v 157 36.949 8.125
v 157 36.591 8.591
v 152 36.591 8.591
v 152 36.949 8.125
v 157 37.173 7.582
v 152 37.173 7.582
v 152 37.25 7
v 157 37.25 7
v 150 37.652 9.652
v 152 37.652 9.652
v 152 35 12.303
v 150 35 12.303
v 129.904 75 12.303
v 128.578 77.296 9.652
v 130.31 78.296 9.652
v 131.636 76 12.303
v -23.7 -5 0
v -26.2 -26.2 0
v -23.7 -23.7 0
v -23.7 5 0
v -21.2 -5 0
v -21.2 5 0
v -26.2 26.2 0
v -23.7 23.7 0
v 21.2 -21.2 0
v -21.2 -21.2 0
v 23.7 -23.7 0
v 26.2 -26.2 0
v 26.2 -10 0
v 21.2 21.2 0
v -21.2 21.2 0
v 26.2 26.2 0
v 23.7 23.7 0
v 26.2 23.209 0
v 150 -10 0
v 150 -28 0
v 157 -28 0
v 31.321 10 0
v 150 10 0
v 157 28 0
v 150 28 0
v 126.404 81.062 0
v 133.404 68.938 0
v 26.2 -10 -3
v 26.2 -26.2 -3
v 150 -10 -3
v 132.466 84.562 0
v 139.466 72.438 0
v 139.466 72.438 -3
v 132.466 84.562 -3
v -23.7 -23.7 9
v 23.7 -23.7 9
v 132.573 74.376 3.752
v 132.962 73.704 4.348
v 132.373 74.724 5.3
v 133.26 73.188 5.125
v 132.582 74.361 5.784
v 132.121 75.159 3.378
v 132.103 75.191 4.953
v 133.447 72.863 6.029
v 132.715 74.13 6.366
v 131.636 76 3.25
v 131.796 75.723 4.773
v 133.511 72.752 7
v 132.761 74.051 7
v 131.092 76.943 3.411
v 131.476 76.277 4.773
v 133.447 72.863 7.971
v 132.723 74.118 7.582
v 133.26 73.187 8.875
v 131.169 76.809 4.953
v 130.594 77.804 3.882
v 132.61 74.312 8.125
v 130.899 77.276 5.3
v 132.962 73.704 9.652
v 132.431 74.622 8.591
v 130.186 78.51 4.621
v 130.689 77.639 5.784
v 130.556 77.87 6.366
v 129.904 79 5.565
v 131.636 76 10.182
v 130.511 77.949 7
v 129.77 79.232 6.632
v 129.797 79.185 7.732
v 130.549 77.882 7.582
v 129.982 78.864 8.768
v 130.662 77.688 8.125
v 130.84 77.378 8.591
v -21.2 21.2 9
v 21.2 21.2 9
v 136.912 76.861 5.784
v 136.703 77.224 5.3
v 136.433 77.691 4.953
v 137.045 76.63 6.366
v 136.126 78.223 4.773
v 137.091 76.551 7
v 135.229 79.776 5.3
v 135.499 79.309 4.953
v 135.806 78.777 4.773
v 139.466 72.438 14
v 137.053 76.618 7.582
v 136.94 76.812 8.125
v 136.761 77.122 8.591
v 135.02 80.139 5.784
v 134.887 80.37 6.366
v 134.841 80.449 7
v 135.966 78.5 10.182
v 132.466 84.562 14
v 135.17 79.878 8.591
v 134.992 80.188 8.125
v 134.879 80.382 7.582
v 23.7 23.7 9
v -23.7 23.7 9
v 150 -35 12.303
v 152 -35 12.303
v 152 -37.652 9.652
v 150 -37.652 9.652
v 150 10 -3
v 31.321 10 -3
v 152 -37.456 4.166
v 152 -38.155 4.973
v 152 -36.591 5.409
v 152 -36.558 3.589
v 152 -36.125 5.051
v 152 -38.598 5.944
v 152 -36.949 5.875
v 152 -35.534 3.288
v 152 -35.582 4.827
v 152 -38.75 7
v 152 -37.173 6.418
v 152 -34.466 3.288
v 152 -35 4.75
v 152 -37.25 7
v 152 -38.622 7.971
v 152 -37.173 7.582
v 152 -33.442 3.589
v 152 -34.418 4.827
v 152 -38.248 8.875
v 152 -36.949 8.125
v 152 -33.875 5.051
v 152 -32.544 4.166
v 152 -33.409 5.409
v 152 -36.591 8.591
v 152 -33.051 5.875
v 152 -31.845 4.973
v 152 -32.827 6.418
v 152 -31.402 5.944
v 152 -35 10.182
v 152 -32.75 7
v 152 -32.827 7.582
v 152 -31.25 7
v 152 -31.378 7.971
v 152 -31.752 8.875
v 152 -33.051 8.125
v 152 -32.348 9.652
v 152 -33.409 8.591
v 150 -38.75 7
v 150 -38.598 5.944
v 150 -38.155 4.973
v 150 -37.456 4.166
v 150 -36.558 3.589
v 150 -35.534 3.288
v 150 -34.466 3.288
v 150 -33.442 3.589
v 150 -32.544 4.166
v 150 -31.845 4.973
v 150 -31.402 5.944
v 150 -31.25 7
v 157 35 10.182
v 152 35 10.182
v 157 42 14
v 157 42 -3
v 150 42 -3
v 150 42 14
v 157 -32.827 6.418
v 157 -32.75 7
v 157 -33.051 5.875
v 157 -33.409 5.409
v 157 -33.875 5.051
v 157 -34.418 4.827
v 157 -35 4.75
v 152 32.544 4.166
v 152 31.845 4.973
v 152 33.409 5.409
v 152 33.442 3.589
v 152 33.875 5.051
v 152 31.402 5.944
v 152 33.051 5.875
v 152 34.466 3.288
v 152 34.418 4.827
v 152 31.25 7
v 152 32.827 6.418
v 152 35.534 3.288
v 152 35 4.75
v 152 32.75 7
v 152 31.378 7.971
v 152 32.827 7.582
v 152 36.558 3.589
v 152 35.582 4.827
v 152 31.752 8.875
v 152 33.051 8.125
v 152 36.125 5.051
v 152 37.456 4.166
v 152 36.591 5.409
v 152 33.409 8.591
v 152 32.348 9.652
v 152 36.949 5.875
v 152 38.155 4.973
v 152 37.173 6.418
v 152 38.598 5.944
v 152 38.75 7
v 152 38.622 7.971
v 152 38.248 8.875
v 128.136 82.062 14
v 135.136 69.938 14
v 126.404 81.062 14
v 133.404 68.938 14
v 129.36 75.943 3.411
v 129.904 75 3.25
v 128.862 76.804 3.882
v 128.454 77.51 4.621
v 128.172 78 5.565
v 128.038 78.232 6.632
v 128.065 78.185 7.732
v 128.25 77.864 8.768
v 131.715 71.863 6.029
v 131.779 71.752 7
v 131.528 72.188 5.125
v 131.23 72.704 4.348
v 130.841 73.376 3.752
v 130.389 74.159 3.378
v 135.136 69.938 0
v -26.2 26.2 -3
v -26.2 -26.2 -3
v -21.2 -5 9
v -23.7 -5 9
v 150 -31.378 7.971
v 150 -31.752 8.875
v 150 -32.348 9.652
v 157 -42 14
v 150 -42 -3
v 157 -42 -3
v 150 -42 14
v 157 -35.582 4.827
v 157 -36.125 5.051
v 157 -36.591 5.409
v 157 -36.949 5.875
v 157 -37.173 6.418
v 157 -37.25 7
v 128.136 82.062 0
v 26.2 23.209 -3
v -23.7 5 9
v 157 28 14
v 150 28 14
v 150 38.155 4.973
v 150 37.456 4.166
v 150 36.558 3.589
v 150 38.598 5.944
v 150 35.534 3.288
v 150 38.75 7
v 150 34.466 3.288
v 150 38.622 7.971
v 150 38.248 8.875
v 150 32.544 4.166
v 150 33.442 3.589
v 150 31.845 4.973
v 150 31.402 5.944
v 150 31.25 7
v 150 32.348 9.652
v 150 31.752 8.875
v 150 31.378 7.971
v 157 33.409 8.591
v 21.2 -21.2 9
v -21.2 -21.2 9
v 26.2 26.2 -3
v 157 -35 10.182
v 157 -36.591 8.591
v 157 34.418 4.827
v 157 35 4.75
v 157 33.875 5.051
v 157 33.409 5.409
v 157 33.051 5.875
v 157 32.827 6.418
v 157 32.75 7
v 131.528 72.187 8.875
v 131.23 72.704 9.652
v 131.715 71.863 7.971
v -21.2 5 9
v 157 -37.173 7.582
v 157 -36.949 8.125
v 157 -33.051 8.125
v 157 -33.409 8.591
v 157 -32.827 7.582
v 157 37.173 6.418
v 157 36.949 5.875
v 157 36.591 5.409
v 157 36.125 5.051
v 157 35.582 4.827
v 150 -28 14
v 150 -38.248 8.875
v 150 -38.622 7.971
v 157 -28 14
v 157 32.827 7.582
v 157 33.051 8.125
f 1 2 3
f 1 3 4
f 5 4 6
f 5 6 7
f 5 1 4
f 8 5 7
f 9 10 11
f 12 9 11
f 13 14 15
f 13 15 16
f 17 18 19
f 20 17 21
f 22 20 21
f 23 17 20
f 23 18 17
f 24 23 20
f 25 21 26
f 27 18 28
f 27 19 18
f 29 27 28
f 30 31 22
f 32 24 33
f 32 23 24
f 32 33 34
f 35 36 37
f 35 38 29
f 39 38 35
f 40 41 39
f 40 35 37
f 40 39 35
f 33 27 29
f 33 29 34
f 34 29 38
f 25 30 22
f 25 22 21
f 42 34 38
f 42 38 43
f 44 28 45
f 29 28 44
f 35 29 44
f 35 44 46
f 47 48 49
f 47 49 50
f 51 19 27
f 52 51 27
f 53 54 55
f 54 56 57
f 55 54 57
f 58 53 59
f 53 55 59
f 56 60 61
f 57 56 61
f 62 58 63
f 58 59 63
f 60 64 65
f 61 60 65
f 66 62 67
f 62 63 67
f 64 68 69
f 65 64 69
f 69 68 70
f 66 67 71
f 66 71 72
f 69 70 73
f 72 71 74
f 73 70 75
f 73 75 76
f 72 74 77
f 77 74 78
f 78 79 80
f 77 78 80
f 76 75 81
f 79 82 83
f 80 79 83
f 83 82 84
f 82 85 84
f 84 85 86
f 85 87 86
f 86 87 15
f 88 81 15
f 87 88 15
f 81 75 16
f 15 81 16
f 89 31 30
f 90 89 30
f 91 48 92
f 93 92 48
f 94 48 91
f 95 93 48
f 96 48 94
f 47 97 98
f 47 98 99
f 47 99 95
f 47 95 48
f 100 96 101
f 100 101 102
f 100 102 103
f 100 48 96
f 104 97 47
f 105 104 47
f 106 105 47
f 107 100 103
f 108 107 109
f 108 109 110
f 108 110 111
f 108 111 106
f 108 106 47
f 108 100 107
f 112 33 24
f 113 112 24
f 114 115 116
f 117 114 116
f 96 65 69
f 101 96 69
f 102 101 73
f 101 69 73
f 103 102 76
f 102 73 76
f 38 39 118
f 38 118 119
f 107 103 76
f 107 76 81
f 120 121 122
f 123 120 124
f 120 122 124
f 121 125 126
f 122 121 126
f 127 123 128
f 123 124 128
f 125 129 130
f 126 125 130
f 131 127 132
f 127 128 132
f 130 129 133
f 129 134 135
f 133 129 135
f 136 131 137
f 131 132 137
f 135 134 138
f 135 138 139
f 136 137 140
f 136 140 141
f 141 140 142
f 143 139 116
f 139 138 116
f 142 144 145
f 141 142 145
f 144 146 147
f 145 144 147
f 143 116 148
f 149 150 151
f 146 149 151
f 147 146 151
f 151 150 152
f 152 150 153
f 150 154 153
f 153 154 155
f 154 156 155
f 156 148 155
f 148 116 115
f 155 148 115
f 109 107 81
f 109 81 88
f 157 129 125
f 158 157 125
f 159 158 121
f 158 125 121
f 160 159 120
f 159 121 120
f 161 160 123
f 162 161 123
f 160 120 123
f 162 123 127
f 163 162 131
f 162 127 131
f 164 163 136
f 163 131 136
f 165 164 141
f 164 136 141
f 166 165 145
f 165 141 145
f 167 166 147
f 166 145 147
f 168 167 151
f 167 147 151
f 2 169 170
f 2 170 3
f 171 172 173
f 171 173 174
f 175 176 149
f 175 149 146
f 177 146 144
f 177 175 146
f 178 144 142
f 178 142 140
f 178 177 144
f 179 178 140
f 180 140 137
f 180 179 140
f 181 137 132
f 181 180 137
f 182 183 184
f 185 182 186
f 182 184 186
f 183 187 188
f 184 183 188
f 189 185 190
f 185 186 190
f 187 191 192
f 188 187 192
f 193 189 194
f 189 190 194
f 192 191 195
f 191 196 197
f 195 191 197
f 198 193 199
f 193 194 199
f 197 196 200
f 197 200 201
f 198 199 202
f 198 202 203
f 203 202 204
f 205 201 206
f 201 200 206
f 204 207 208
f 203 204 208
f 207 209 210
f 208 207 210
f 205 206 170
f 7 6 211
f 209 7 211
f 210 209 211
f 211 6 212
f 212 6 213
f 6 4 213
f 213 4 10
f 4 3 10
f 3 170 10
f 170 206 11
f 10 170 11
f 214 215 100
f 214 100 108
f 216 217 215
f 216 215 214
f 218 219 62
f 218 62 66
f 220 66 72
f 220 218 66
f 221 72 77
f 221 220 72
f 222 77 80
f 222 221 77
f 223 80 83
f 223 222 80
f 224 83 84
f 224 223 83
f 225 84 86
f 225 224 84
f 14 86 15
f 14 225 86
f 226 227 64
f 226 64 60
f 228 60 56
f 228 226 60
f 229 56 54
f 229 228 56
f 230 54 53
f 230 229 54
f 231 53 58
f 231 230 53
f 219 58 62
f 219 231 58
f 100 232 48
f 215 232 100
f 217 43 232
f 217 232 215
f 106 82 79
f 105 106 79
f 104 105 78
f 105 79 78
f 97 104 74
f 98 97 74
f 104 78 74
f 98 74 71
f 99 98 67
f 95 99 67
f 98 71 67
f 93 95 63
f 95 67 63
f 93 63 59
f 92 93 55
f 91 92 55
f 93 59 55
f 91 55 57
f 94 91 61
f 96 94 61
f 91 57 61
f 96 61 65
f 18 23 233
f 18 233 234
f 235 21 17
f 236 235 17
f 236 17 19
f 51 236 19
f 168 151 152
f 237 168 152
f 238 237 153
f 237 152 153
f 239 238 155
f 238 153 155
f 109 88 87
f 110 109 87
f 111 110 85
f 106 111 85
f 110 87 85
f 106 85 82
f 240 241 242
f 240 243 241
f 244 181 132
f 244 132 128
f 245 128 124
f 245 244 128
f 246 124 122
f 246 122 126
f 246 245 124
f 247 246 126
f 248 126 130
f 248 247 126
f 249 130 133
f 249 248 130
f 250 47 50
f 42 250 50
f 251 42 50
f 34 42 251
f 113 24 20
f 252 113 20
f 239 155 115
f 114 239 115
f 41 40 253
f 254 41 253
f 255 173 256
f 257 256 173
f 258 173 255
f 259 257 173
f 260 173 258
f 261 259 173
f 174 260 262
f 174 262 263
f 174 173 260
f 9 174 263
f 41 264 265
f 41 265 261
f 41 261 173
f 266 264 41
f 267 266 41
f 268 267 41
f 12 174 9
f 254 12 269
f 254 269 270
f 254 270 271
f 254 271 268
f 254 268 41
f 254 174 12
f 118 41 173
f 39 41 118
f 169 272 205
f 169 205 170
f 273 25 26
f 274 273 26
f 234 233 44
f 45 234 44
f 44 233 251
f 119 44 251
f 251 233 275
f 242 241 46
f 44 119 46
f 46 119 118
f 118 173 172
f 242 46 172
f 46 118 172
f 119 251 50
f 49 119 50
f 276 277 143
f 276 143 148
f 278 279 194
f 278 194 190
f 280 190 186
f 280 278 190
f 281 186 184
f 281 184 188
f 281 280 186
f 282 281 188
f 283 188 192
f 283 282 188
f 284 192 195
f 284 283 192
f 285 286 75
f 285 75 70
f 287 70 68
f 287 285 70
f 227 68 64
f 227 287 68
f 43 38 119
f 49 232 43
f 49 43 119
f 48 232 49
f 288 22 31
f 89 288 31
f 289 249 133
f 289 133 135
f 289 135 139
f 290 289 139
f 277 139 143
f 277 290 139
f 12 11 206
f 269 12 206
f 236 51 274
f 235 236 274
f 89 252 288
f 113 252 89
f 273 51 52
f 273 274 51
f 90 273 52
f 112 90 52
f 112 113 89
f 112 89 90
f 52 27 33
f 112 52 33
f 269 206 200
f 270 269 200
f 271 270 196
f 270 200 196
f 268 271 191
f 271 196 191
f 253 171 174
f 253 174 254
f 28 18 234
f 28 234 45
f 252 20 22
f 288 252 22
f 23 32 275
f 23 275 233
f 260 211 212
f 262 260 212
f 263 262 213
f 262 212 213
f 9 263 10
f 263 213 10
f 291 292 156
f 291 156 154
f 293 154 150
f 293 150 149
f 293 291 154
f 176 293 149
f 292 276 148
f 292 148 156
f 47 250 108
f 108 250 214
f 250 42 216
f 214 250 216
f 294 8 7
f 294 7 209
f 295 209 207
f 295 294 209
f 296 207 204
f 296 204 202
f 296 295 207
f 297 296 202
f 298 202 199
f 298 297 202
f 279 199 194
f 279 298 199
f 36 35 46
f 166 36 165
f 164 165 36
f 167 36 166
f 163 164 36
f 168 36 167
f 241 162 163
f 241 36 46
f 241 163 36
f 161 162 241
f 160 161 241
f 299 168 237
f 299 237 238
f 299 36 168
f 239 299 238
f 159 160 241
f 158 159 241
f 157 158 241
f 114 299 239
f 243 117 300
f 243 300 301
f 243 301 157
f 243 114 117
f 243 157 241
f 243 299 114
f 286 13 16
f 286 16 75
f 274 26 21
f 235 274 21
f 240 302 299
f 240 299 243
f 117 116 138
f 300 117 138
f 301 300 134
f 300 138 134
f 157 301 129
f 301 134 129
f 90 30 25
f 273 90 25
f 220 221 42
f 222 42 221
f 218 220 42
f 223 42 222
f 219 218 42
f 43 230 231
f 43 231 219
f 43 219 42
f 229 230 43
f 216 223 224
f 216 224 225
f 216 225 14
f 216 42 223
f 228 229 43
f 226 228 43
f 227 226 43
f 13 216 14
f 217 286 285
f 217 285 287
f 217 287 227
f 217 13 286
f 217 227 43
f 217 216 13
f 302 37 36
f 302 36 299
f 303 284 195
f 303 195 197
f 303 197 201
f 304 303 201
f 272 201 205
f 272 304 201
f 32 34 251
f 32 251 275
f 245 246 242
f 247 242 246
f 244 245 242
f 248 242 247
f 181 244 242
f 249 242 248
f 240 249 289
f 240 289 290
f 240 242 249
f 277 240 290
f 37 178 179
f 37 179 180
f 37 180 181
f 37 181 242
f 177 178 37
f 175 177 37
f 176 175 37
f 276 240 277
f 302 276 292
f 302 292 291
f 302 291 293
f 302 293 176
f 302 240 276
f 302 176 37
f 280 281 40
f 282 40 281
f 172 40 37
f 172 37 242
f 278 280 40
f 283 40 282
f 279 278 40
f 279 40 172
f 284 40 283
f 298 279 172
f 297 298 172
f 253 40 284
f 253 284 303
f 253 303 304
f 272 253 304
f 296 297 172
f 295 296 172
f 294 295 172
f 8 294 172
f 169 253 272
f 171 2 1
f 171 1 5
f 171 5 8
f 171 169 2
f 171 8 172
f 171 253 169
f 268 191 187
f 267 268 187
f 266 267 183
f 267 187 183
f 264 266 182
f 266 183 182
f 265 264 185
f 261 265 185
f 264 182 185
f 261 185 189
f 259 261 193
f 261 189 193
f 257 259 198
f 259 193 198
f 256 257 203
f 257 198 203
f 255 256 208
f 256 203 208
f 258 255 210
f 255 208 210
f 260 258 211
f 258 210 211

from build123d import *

# Parameters (mm, degrees)
F1_DEPTH  = 9
F2_W      = 123.8
F2_H      = 10
F3_DEPTH  = 3
F5_DEPTH  = 5
F6_W      = 14
F6_H      = 14
F7_DEPTH  = 2
F10_DEPTH = 2
F11_W     = 14
F11_H     = 14
F12_DEPTH = 5


with BuildPart() as f1:
    # F0 (on Top) → F1 (new body)
    with BuildSketch(Plane.XY):
        Polygon((-21.2, 21.2), (21.2, 21.2), (21.2, 0), (23.7, 0), (23.7, 23.7), (-23.7, 23.7), (-23.7, 5), (-21.2, 5), align=None)
        Polygon((23.7, 0), (21.2, 0), (21.2, -21.2), (-21.2, -21.2), (-21.2, -5), (-23.7, -5), (-23.7, -23.7), (23.7, -23.7), align=None)
    extrude(amount=F1_DEPTH)

    # F2 (on Top) → F3 (join)
    with BuildSketch(Plane.XY):
        Polygon((-26.2, 26.2), (-26.2, -26.2), (26.2, -26.2), (26.2, -10), (26.2, 0), (0, 0), (26.2, 15.1265770528), (26.2, 23.2094808214), (26.2, 26.2), align=None)
        Polygon((150, 40.1923788647), (150, 10), (157, 10), (157, 35), (157, 42), (150, 42), align=None)
        Polygon((26.2, 10), (26.2, 0), (150, 0), (150, 10), (31.3205080757, 10), align=None)
        Polygon((150, 0), (150, -10), (157, -10), (157, 10), (150, 10), align=None)
        Polygon((157, -10), (150, -10), (150, -40.1923788647), (150, -42), (157, -42), (157, -35), align=None)
        with Locations((88.1, -5)):
            Rectangle(F2_W, F2_H)
        Polygon((0, 0), (26.2, 0), (26.2, 10), (26.2, 15.1265770528), align=None)
        Polygon((126.4038105677, 81.0621778265), (26.2, 23.2094808214), (26.2, 15.1265770528), (129.9038105677, 75), align=None)
        Polygon((26.2, 15.1265770528), (26.2, 10), (31.3205080757, 10), (133.4038105677, 68.9378221735), (129.9038105677, 75), align=None)
        Polygon((132.4659883942, 84.5621778265), (126.4038105677, 81.0621778265), (129.9038105677, 75), (133.4038105677, 68.9378221735), (139.4659883942, 72.4378221735), align=None)
    extrude(amount=-F3_DEPTH)

    # F4 (on face) → F5 (join)
    with BuildSketch(Plane.YZ.offset(157)):
        Polygon((28, 0), (35, 0), (42, 0), (42, 14), (28, 14), align=None)
        with BuildLine():
            ThreePointArc((37.25, 7), (36.5909902577, 5.4090097423), (35, 4.75))
            ThreePointArc((35, 4.75), (33.4090097423, 5.4090097423), (32.75, 7))
            ThreePointArc((32.75, 7), (32.9212710518, 7.8610377228), (33.4090097423, 8.5909902577))
            Line((33.4090097423, 8.5909902577), (35, 10.1819805153))
            Line((35, 10.1819805153), (36.5909902577, 8.5909902577))
            ThreePointArc((36.5909902577, 8.5909902577), (37.0787289482, 7.8610377228), (37.25, 7))
        make_face(mode=Mode.SUBTRACT)
        Polygon((-35, 0), (-28, 0), (-28, 14), (-42, 14), (-42, 0), align=None)
        with BuildLine():
            ThreePointArc((-32.75, 7), (-33.4090097423, 5.4090097423), (-35, 4.75))
            ThreePointArc((-35, 4.75), (-36.5909902577, 5.4090097423), (-37.25, 7))
            ThreePointArc((-37.25, 7), (-37.0787289482, 7.8610377228), (-36.5909902577, 8.5909902577))
            Line((-36.5909902577, 8.5909902577), (-35, 10.1819805153))
            Line((-35, 10.1819805153), (-33.4090097423, 8.5909902577))
            ThreePointArc((-33.4090097423, 8.5909902577), (-32.9212710518, 7.8610377228), (-32.75, 7))
        make_face(mode=Mode.SUBTRACT)
    extrude(amount=-F5_DEPTH)

    # F6 (on face) → F7 (join)
    with BuildSketch(Plane(origin=(152, 0, 0), x_dir=(0, -1, 0), z_dir=(-1, 0, 0))):
        with Locations((-35, 7)):
            Rectangle(F6_W, F6_H)
        with BuildLine():
            ThreePointArc((-32.3483495706, 9.6516504294), (-31.5354517531, 8.4350628714), (-31.25, 7))
            ThreePointArc((-31.25, 7), (-35, 3.25), (-38.75, 7))
            ThreePointArc((-38.75, 7), (-38.4645482469, 8.4350628714), (-37.6516504294, 9.6516504294))
            Line((-37.6516504294, 9.6516504294), (-35, 12.3033008589))
            Line((-35, 12.3033008589), (-32.3483495706, 9.6516504294))
        make_face(mode=Mode.SUBTRACT)
        with Locations((35, 7)):
            Rectangle(F6_W, F6_H)
        with BuildLine():
            ThreePointArc((37.6516504294, 9.6516504294), (38.4645482469, 8.4350628714), (38.75, 7))
            ThreePointArc((38.75, 7), (35, 3.25), (31.25, 7))
            ThreePointArc((31.25, 7), (31.5354517531, 8.4350628714), (32.3483495706, 9.6516504294))
            Line((32.3483495706, 9.6516504294), (35, 12.3033008589))
            Line((35, 12.3033008589), (37.6516504294, 9.6516504294))
        make_face(mode=Mode.SUBTRACT)
    extrude(amount=F7_DEPTH)

    # F9 (on line) → F10 (join)
    with BuildSketch(Plane(origin=(129.9038105677, 75, 0), x_dir=(0.5, -0.8660254038, 0), z_dir=(-0.8660254038, -0.5, 0))):
        Polygon((-7, 0), (0, 0), (7, 0), (7, 14), (-7, 14), align=None)
        with BuildLine():
            ThreePointArc((3.75, 7), (2.6516504294, 4.3483495706), (0, 3.25))
            ThreePointArc((0, 3.25), (-3.4645482469, 5.5649371286), (-2.6516504294, 9.6516504294))
            Line((-2.6516504294, 9.6516504294), (0, 12.3033008589))
            Line((0, 12.3033008589), (2.6516504294, 9.6516504294))
            ThreePointArc((2.6516504294, 9.6516504294), (3.4645482469, 8.4350628714), (3.75, 7))
        make_face(mode=Mode.SUBTRACT)
    extrude(amount=-F10_DEPTH)

    # F11 (on face) → F12 (join)
    with BuildSketch(Plane(origin=(131.6358613752, 76, 0), x_dir=(-0.5, 0.8660254038, 0), z_dir=(0.8660254038, 0.5, 0))):
        with Locations((0, 7)):
            Rectangle(F11_W, F11_H)
        with BuildLine():
            Line((-2.6516504294, 9.6516504294), (0, 12.3033008589))
            Line((0, 12.3033008589), (2.6516504294, 9.6516504294))
            ThreePointArc((2.6516504294, 9.6516504294), (0, 3.25), (-2.6516504294, 9.6516504294))
        make_face(mode=Mode.SUBTRACT)
        with BuildLine():
            Line((2.6516504294, 9.6516504294), (0, 12.3033008589))
            Line((0, 12.3033008589), (-2.6516504294, 9.6516504294))
            ThreePointArc((-2.6516504294, 9.6516504294), (0, 3.25), (2.6516504294, 9.6516504294))
        make_face()
        with BuildLine():
            ThreePointArc((1.5909902577, 8.5909902577), (2.0787289482, 7.8610377228), (2.25, 7))
            ThreePointArc((2.25, 7), (0, 4.75), (-2.25, 7))
            ThreePointArc((-2.25, 7), (-2.0787289482, 7.8610377228), (-1.5909902577, 8.5909902577))
            Line((-1.5909902577, 8.5909902577), (0, 10.1819805153))
            Line((0, 10.1819805153), (1.5909902577, 8.5909902577))
        make_face(mode=Mode.SUBTRACT)
    extrude(amount=F12_DEPTH)


solid = f1.part
